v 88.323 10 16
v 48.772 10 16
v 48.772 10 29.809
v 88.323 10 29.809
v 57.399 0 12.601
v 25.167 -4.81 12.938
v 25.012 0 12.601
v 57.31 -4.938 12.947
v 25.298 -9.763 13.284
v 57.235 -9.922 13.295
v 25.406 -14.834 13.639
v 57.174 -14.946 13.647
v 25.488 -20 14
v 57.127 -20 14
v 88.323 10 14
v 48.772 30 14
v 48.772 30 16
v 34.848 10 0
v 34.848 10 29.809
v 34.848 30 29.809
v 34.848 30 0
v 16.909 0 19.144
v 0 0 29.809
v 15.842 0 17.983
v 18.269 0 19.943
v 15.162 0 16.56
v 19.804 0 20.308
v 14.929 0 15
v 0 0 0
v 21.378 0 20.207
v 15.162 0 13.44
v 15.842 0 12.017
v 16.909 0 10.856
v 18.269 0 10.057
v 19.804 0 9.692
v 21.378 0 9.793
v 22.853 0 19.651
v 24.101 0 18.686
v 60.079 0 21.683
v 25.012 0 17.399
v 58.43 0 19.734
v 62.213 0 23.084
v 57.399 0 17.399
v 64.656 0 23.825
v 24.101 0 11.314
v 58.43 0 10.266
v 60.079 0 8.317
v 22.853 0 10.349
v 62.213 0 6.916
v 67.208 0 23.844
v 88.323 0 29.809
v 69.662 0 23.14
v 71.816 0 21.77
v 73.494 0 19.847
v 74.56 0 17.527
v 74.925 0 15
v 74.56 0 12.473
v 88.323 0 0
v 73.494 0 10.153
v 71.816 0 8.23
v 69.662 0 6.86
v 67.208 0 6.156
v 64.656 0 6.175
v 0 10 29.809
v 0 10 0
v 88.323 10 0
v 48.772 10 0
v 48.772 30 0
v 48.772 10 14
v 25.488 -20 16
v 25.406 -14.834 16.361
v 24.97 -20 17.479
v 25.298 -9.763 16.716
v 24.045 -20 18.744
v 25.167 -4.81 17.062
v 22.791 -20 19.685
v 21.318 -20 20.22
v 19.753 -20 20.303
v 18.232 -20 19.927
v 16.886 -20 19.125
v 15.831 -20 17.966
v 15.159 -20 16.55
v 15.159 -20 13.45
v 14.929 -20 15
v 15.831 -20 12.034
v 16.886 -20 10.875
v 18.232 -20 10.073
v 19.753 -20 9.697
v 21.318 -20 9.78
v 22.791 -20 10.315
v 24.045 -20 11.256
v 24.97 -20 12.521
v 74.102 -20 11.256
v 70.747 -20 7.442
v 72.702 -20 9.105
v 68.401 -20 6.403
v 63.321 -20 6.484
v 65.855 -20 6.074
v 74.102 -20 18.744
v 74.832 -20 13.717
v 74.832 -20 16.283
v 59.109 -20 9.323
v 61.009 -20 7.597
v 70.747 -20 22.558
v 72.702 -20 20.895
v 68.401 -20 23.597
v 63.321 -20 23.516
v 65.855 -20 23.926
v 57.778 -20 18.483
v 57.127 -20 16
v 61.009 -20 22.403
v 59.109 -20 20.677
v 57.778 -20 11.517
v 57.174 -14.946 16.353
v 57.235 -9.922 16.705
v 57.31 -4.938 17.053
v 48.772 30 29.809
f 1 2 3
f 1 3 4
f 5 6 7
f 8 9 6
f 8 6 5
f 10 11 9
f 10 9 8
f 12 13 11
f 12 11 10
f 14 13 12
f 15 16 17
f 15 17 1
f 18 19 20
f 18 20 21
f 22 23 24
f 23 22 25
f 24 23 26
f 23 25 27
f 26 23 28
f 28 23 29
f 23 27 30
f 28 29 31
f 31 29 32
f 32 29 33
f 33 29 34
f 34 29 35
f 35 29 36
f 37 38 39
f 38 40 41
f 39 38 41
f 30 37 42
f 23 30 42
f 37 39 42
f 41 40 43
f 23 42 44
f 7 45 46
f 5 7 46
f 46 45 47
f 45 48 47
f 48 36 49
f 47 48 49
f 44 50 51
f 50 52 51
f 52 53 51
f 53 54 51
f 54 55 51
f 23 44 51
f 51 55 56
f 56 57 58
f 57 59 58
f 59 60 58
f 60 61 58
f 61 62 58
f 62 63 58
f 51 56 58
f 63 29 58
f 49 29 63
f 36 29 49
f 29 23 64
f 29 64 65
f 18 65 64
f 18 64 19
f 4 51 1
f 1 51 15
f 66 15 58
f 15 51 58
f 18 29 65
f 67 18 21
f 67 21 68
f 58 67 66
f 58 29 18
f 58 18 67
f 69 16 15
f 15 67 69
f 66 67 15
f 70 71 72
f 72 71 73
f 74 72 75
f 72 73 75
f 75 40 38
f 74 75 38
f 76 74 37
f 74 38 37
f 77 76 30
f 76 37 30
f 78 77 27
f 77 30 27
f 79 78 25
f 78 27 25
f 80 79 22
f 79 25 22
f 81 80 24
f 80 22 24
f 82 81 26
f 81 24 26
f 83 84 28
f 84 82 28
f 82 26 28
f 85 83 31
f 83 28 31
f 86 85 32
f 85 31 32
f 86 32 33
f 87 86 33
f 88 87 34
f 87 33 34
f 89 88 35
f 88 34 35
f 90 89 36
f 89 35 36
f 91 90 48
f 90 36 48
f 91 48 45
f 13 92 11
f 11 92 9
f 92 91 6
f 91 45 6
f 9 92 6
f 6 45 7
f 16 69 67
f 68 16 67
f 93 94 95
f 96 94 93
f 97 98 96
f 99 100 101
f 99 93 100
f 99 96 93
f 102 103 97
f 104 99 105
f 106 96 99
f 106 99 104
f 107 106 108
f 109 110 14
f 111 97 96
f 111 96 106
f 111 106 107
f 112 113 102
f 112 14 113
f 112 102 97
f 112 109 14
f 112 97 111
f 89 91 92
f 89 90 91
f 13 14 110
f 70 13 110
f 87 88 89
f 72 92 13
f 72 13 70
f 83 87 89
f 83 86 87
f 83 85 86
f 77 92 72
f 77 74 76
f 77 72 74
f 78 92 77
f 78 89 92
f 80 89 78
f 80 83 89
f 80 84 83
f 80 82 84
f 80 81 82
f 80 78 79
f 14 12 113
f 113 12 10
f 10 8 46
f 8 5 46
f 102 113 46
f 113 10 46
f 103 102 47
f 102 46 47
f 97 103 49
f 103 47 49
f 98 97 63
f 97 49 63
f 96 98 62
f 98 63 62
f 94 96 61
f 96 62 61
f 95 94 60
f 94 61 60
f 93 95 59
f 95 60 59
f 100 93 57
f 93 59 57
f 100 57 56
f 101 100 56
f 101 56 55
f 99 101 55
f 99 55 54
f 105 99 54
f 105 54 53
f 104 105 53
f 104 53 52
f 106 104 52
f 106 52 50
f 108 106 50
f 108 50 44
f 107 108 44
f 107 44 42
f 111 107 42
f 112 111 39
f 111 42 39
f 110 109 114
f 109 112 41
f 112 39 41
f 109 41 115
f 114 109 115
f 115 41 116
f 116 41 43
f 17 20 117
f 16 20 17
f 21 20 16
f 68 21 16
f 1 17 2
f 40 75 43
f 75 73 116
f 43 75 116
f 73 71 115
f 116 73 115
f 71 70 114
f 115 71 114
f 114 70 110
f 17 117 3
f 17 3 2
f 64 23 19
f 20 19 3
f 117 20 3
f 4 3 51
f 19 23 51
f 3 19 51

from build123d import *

# Parameters (mm, degrees)
SKETCH1_W           = 88.323262869
SKETCH1_H           = 29.809101218
BOSS_EXTRUDE1_DEPTH = 10
SKETCH2_W           = 13.924014339
SKETCH2_H           = 29.809101218
BOSS_EXTRUDE2_DEPTH = 20
RIB1_REACH          = 96.478
SKETCH4_WALL_W      = 235.275808006
SKETCH4_WALL_H      = 2
SKETCH5_R           = 5.326775894
SKETCH5_R_2         = 8.926735981
BOSS_EXTRUDE3_DEPTH = 20
RIB2_REACH          = 96.478
SKETCH6_WALL_W      = 222.44376487
SKETCH6_WALL_H      = 2
RIB2_DRAFT_ANGLE    = 4


with BuildPart() as part:
    # Sketch1 → Boss-Extrude1 (new body)
    with BuildSketch(Plane(origin=(0, 0, 0), x_dir=(1, 0, 0), z_dir=(0, 1, 0))):
        with Locations((44.161631435, -14.904550609)):
            Rectangle(SKETCH1_W, SKETCH1_H)
    extrude(amount=BOSS_EXTRUDE1_DEPTH)

    # Sketch2 → Boss-Extrude2 (add)
    with BuildSketch(Plane(origin=(0, 10, 0), x_dir=(1, 0, 0), z_dir=(0, 1, 0))):
        with Locations((41.809601986, -14.904550609)):
            Rectangle(SKETCH2_W, SKETCH2_H)
    extrude(amount=BOSS_EXTRUDE2_DEPTH)

    # Sketch4 wall → Rib1 (add, up to next)
    with BuildSketch(Plane(origin=(68.547436012, 20, 15), x_dir=(0.892394851297, -0.451255392631, 0), z_dir=(0.451255392631, 0.892394851297, 0)), mode=Mode.PRIVATE) as rib1_sk1:
        Rectangle(SKETCH4_WALL_W, SKETCH4_WALL_H)
    rib1_tool1 = extrude(rib1_sk1.sketch, amount=-RIB1_REACH, mode=Mode.PRIVATE) - part.part
    add(rib1_tool1.solids().sort_by_distance((68.547436012, 20, 15))[0])

    # Sketch5 → Boss-Extrude3 (add)
    with BuildSketch(Plane.XZ):
        with Locations(Location((20.255604114, 15, 0), (0, 0, 90))):
            Circle(SKETCH5_R)
        with Locations(Location((65.99787284, 15, 0), (0, 0, 90))):
            Circle(SKETCH5_R_2)
    extrude(amount=BOSS_EXTRUDE3_DEPTH)

    # Sketch6 wall → Rib2 (add, up to next)
    with BuildSketch(Plane(origin=(41.326758433, -20, 15), x_dir=(1, 0, 0), z_dir=(0, 1, 0)), mode=Mode.PRIVATE) as rib2_sk1:
        Rectangle(SKETCH6_WALL_W, SKETCH6_WALL_H)
    rib2_tool1 = extrude(rib2_sk1.sketch, amount=RIB2_REACH, mode=Mode.PRIVATE) - part.part
    add(rib2_tool1.solids().sort_by_distance((41.326758433, -20, 15))[0])

    # Rib2 draft
    rib2_draft_faces = [part.faces().sort_by_distance(p)[0] for p in [
        (41.326758433, -19.5, 14),
        (41.326758433, -19.5, 16),
    ]]
    draft(rib2_draft_faces, Plane(origin=(41.326758433, -20, 15), x_dir=(1, 0, 0), z_dir=(0, -1, 0)), RIB2_DRAFT_ANGLE)


solid = part.part
